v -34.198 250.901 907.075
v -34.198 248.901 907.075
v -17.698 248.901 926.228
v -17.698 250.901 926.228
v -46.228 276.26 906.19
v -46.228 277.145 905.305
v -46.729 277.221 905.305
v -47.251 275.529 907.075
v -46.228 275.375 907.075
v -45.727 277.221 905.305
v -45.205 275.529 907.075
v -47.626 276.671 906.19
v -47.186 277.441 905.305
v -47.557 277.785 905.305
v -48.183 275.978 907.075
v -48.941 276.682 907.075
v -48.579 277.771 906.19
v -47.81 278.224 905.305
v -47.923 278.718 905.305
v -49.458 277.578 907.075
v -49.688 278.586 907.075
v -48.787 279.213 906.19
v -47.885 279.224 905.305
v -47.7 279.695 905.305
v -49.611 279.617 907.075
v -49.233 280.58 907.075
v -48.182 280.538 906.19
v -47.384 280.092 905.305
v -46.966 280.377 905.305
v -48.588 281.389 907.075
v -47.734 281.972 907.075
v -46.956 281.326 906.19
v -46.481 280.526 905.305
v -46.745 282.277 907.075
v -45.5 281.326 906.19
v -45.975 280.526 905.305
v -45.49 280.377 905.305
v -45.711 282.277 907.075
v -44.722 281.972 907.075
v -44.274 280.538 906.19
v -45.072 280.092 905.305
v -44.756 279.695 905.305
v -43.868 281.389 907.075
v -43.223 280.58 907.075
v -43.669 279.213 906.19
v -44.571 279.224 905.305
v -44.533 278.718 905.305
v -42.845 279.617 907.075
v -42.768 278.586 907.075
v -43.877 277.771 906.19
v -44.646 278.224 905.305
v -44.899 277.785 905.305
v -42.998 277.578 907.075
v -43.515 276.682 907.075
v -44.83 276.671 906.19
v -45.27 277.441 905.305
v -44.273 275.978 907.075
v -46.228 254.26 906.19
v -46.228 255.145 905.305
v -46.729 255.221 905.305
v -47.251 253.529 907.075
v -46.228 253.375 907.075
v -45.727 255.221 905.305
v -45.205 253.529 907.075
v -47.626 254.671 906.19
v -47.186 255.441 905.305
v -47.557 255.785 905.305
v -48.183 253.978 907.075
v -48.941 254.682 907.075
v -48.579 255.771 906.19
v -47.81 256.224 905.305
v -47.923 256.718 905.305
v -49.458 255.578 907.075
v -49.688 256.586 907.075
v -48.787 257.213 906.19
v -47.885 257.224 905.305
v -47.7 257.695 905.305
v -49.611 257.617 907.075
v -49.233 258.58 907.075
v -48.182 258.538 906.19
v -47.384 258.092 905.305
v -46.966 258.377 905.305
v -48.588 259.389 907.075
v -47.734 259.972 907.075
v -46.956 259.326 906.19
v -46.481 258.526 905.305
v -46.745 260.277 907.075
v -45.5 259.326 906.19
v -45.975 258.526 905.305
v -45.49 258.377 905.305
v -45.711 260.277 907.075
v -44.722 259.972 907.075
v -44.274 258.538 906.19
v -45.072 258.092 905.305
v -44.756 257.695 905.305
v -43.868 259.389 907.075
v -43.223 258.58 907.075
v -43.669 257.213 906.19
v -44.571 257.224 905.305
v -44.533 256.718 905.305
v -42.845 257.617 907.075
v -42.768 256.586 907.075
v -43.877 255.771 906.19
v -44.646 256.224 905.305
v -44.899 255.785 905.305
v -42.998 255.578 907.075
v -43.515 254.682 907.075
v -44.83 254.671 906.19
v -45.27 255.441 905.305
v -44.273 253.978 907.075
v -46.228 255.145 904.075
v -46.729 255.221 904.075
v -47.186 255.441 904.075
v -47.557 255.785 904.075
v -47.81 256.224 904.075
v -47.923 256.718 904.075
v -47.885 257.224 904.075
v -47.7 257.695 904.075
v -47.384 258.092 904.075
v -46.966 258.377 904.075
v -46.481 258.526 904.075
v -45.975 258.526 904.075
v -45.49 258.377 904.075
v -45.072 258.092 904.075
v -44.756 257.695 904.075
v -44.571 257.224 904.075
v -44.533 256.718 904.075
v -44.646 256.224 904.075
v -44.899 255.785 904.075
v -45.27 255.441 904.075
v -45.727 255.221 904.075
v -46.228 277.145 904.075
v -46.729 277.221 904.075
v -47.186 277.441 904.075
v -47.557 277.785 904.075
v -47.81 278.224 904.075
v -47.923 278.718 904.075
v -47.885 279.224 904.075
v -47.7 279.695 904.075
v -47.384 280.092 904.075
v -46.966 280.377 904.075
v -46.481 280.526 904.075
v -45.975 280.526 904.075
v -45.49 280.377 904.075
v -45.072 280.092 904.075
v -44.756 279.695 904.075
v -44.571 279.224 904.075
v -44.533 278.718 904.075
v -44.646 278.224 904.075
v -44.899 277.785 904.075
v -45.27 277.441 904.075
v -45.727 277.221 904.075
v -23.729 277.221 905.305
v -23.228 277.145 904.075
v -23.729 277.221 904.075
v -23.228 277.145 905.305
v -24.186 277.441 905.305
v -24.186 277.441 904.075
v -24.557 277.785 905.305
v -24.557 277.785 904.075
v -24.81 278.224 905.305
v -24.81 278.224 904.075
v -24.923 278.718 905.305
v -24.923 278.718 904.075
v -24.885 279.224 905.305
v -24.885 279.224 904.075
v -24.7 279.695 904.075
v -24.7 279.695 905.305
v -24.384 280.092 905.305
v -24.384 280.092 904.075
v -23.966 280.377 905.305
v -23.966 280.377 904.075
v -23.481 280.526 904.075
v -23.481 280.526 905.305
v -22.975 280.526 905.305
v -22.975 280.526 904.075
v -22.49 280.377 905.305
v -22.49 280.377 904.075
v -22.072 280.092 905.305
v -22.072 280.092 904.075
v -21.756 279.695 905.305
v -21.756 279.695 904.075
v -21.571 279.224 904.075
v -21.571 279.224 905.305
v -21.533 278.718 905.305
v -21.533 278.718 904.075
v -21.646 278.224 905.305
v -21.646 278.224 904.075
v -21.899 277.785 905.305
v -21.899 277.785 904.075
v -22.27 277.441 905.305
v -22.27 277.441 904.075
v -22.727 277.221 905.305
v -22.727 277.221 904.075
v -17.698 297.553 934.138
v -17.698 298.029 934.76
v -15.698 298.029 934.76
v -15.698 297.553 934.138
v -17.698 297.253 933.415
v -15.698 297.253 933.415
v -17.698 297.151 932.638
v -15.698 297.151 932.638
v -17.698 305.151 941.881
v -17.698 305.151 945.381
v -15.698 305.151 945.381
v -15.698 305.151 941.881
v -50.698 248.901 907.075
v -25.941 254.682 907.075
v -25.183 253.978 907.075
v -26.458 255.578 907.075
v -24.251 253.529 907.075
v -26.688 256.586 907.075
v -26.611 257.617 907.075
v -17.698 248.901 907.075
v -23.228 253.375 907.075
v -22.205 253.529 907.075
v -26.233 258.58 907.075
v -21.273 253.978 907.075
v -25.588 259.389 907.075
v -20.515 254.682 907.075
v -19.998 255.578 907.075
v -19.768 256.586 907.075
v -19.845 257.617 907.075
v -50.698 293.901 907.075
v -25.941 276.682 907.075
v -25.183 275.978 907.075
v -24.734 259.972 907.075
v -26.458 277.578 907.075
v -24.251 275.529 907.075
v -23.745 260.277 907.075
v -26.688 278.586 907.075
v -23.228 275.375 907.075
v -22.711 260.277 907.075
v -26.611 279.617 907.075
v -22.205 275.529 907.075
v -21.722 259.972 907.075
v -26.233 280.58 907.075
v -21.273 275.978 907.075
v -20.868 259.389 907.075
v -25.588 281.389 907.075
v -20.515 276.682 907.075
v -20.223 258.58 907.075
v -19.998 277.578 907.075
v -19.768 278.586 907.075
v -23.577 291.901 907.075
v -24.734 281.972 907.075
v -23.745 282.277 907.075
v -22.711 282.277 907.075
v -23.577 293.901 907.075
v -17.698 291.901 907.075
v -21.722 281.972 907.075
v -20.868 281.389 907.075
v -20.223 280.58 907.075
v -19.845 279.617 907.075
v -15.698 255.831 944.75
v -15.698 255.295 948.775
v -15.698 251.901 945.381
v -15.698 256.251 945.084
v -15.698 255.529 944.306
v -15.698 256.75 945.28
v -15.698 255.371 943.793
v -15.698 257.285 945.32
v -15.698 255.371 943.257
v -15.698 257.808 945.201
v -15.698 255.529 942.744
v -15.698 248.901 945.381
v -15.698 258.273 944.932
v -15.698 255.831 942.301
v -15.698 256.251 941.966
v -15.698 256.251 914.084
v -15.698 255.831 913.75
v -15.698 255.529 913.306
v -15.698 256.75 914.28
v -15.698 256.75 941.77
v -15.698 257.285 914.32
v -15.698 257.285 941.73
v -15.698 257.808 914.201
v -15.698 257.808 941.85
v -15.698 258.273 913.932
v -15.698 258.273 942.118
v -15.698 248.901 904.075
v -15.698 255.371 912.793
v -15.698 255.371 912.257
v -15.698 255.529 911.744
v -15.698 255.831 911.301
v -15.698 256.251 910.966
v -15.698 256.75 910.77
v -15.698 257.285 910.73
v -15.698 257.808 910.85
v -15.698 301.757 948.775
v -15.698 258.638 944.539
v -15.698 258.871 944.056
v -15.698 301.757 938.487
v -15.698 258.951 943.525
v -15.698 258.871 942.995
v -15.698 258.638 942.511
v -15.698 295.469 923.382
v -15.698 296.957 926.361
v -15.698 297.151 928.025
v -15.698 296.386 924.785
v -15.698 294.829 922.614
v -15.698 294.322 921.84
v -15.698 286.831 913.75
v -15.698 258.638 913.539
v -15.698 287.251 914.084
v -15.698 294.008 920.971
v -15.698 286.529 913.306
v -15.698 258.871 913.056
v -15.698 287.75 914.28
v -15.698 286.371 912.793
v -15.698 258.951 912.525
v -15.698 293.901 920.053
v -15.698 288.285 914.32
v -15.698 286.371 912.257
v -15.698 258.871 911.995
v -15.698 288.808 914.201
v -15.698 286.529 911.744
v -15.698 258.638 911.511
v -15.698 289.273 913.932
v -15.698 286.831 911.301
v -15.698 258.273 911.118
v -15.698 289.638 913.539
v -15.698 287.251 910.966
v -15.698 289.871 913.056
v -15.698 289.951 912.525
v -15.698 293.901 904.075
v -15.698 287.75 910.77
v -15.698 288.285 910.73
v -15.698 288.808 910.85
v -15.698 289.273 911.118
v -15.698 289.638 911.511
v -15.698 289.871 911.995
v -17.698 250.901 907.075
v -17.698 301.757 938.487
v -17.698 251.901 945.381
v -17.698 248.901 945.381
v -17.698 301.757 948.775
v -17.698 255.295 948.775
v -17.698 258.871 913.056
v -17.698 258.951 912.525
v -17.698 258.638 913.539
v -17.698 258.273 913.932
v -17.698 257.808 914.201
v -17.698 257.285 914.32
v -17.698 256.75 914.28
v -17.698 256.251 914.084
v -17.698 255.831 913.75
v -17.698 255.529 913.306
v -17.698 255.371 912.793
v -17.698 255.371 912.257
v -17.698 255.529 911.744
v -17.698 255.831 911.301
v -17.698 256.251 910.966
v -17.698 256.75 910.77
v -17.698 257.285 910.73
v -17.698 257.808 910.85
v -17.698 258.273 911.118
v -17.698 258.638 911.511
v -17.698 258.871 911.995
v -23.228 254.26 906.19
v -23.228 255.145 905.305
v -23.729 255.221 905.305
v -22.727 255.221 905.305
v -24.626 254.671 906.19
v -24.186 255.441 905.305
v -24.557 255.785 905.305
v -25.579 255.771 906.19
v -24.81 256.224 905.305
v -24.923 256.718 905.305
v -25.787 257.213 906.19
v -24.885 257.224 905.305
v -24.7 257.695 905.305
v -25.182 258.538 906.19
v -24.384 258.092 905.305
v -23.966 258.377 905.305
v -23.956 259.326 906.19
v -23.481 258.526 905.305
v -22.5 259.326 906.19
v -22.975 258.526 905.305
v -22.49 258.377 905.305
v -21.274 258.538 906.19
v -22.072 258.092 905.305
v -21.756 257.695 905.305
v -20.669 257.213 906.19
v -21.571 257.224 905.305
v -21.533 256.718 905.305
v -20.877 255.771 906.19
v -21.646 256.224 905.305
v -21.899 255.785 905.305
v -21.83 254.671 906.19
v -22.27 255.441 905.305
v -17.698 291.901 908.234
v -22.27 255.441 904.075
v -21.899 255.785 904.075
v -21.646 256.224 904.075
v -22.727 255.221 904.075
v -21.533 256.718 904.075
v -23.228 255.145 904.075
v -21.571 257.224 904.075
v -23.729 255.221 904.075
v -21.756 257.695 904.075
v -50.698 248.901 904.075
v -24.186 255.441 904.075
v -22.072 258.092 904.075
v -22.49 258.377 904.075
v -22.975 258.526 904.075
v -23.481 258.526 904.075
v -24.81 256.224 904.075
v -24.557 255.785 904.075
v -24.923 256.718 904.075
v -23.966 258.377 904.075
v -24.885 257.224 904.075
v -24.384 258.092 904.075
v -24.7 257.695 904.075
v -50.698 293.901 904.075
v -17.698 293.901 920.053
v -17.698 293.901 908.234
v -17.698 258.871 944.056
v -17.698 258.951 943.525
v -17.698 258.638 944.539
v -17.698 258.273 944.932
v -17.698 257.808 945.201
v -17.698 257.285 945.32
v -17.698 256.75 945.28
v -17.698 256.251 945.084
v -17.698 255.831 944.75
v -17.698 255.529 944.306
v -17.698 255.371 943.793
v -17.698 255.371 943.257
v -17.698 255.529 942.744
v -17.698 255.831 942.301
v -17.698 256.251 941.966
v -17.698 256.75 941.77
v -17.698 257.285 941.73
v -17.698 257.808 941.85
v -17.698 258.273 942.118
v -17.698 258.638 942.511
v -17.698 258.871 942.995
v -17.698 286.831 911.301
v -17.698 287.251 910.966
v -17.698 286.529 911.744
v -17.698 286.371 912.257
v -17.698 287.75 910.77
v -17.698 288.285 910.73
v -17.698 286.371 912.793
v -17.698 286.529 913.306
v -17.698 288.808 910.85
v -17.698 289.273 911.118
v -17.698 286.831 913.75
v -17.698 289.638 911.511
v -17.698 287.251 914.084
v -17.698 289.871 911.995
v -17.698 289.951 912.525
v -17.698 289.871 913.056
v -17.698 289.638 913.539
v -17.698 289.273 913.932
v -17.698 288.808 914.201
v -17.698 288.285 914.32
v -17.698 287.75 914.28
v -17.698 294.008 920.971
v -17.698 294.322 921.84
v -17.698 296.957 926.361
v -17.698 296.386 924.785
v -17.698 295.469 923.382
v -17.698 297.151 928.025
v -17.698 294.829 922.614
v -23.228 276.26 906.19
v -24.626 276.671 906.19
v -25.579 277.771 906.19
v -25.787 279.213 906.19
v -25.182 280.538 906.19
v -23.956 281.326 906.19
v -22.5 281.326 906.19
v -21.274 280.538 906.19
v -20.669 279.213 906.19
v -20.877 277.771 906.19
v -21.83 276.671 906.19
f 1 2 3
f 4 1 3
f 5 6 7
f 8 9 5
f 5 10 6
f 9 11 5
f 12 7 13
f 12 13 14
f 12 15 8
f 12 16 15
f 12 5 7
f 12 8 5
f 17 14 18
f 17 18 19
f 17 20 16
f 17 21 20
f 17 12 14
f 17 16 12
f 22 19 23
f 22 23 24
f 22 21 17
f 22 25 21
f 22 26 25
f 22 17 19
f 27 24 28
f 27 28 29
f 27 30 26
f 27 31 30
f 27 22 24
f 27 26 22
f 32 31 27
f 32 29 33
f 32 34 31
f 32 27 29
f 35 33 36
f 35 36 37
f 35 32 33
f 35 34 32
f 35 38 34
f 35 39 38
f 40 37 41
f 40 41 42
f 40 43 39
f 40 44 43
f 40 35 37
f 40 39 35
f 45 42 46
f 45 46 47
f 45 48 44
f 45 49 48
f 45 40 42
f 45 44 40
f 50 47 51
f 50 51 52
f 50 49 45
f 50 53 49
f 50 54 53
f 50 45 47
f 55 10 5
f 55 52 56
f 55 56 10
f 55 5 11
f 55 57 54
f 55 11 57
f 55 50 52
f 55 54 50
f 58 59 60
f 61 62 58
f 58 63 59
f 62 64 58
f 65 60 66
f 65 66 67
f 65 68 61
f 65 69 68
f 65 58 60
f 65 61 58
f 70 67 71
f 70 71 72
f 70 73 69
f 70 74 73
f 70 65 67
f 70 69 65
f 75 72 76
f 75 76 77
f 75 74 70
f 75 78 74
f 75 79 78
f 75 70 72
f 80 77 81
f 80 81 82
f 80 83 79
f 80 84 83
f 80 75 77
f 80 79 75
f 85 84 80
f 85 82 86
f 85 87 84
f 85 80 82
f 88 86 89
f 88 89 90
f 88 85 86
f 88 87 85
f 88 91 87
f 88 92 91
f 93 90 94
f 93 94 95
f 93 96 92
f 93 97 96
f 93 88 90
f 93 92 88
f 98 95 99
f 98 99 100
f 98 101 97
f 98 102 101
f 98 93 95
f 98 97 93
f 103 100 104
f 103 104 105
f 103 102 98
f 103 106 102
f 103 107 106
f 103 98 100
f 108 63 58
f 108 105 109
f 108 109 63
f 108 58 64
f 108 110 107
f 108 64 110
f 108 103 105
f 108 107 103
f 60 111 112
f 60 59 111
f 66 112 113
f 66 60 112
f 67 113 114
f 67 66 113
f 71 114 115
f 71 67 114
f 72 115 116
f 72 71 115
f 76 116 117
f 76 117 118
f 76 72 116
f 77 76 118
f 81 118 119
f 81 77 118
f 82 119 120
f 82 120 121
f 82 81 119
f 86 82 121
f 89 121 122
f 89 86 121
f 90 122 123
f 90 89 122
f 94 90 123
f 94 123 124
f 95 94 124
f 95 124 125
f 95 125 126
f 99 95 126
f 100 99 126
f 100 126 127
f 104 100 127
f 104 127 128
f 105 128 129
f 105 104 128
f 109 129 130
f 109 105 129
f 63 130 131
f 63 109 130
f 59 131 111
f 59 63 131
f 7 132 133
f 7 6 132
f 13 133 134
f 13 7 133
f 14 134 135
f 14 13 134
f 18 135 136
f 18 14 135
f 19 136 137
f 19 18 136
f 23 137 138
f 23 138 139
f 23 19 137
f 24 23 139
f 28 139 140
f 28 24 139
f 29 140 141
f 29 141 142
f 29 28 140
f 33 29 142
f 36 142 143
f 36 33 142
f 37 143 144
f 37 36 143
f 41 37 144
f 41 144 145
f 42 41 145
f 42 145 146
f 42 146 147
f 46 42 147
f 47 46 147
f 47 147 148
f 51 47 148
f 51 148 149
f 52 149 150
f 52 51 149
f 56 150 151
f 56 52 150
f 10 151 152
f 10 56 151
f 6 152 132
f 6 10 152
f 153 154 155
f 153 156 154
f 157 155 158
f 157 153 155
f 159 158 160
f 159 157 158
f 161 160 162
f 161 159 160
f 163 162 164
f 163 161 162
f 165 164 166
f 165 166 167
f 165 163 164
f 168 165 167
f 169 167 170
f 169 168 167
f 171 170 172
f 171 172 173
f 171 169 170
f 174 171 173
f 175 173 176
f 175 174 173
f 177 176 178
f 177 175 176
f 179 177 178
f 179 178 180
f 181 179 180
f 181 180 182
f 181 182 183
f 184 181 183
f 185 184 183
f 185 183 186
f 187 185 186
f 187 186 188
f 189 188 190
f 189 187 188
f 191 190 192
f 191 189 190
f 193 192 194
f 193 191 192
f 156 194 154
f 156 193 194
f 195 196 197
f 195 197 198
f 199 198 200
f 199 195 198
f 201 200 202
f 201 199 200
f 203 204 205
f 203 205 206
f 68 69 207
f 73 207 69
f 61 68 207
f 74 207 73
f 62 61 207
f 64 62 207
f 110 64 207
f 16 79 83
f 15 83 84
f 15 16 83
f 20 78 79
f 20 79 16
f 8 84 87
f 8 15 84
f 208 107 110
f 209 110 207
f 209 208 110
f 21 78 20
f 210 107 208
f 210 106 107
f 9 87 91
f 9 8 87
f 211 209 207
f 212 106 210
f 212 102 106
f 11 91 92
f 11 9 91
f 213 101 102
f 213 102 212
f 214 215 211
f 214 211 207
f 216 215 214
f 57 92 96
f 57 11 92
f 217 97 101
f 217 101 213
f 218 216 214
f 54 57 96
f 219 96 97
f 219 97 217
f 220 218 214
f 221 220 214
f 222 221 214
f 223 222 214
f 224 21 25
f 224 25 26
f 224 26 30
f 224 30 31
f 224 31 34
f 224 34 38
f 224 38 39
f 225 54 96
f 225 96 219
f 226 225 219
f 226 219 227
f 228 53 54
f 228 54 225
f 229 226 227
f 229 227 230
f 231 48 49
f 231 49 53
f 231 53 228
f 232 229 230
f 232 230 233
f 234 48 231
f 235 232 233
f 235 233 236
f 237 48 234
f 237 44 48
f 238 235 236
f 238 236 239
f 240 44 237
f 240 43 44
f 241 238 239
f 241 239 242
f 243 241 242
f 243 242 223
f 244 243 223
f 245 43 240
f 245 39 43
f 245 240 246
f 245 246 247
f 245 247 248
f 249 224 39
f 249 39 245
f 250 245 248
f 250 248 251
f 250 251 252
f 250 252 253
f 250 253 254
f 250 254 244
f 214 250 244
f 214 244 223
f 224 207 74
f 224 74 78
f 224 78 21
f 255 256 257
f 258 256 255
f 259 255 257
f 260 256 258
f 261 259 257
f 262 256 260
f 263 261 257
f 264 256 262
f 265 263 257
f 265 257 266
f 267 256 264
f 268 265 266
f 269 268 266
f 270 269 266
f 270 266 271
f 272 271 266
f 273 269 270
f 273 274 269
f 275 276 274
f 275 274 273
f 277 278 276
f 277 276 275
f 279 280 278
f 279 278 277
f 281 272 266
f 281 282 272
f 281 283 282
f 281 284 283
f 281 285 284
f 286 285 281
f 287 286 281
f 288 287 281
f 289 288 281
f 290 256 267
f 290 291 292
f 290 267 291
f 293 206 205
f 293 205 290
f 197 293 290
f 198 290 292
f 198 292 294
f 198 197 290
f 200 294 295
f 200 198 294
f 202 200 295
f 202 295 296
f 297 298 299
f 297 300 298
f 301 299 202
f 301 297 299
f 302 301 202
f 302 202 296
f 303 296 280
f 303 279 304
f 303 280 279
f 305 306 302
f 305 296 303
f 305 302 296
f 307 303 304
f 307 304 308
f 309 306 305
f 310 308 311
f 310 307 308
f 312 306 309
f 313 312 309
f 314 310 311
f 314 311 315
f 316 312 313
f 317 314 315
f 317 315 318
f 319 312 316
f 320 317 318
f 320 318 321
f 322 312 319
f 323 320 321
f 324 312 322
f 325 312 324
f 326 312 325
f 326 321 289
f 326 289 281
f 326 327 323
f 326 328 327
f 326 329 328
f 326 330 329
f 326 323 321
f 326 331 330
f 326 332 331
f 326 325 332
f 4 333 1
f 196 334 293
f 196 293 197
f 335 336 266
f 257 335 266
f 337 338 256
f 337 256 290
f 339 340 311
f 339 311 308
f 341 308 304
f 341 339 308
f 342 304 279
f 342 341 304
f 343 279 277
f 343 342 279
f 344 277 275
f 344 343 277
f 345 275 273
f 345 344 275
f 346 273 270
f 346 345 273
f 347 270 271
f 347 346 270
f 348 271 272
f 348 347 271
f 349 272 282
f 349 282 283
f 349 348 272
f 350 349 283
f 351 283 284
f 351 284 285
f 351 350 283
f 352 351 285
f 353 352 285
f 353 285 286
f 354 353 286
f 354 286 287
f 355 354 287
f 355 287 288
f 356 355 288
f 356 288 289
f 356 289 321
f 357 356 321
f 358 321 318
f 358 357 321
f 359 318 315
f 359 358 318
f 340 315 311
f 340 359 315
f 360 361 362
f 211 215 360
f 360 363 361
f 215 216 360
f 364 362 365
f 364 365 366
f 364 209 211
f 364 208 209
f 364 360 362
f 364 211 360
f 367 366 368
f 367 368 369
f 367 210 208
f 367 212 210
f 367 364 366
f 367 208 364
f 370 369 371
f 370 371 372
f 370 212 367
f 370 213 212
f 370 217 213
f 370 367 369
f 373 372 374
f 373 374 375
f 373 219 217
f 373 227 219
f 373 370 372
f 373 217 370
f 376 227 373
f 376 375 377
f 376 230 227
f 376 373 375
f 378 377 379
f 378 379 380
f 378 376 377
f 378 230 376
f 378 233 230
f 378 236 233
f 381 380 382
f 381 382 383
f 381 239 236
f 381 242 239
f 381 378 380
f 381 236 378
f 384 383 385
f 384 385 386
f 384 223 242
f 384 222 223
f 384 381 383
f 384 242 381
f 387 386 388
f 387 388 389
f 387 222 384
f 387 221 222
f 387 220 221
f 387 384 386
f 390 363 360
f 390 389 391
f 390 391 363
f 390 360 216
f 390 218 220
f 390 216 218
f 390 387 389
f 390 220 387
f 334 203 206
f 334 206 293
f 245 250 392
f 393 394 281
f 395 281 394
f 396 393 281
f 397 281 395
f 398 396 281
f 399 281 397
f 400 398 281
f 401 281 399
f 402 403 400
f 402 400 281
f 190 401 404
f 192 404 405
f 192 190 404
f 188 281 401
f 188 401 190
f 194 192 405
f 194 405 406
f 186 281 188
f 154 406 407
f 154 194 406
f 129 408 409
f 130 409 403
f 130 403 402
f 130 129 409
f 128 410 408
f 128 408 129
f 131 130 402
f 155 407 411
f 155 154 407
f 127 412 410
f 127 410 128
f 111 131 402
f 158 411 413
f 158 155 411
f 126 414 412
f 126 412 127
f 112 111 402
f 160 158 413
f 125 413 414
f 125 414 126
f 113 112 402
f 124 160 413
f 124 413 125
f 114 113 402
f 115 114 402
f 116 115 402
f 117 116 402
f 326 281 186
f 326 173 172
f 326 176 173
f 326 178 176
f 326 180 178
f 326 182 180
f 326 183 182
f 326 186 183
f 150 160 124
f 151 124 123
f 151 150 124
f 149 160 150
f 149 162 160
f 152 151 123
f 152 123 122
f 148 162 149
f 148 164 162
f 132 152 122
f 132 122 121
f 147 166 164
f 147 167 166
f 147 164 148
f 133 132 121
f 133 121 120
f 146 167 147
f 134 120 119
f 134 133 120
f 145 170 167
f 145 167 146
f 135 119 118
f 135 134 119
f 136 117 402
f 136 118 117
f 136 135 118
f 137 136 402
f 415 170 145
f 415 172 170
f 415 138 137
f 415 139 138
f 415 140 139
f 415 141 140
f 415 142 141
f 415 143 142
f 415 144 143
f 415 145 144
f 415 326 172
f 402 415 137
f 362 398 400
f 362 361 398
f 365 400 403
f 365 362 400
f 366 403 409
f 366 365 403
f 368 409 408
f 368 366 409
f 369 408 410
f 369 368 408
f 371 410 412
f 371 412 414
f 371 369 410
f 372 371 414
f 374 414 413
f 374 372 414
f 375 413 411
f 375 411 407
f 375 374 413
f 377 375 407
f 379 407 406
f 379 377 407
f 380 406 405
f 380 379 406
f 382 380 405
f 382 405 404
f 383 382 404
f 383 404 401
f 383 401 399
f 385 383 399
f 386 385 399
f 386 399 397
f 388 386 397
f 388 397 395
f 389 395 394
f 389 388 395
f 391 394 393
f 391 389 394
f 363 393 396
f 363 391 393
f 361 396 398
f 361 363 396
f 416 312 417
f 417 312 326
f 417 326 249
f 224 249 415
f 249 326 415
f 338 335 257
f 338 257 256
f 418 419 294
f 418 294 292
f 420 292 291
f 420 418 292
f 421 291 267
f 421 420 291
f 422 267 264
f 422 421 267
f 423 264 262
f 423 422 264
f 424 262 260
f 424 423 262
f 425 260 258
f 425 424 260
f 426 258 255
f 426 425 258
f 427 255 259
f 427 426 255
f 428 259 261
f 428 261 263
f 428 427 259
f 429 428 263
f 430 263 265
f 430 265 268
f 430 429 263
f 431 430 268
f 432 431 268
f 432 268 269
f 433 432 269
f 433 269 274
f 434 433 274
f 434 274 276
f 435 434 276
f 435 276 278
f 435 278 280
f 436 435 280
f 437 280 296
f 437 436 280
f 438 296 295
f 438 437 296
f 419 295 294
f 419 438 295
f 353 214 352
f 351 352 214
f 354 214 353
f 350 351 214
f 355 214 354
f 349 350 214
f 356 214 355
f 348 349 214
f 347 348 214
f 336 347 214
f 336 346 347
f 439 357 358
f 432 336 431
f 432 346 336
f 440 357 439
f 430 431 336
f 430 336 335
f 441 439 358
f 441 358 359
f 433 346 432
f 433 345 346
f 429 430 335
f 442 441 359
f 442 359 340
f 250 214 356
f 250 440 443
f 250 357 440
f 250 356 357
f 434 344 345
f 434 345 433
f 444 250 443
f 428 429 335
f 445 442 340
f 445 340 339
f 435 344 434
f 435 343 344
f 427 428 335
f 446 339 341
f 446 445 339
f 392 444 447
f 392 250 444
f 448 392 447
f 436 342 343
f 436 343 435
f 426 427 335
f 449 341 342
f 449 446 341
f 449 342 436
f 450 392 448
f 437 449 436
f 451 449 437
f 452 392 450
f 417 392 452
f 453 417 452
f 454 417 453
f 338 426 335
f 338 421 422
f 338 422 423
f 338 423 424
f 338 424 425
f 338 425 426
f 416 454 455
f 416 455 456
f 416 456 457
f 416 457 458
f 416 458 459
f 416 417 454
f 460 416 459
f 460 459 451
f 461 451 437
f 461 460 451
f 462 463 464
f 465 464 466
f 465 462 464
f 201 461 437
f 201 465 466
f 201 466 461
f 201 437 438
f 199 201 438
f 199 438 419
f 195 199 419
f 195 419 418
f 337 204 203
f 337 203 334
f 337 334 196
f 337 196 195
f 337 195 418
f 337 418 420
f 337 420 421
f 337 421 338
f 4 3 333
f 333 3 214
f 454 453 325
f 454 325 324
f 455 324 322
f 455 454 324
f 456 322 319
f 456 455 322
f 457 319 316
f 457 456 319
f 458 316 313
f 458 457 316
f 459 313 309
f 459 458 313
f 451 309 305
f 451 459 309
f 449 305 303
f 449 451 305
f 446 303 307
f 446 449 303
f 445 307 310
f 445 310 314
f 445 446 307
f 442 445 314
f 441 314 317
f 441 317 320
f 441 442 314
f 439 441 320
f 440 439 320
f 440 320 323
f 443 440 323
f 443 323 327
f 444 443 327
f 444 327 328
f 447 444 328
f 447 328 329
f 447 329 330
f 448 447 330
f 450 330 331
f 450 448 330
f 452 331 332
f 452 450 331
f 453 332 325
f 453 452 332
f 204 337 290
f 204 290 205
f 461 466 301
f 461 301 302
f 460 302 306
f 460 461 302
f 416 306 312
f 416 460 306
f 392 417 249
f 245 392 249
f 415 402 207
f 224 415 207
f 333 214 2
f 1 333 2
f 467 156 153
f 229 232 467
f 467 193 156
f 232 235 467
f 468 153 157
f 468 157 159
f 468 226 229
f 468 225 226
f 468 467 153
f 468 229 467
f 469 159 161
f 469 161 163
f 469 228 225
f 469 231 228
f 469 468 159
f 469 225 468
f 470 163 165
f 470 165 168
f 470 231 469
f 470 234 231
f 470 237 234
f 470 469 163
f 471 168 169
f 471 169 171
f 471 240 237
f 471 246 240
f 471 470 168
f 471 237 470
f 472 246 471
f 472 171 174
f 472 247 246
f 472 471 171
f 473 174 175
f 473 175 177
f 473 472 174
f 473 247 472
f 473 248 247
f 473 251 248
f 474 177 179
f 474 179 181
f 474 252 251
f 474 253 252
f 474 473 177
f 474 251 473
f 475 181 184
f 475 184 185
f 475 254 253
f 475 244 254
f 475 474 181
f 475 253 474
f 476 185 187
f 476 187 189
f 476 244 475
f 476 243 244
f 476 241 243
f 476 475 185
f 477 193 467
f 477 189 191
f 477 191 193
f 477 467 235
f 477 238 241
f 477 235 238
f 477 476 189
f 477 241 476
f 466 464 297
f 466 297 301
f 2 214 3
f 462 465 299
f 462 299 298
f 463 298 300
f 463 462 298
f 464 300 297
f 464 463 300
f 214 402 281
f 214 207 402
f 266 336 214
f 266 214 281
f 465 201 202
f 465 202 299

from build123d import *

# Parameters (mm, degrees)
SKETCH1_R                                    = 1.8
BOSS_EXTRUDE1_DEPTH                          = 2
BOSS_EXTRUDE2_DEPTH                          = 33
BOSS_EXTRUDE3_DEPTH                          = 1
BOSS_EXTRUDE4_DEPTH                          = 3
BOSS_EXTRUDE4_DEPTH_BACK                     = 0.0001
BOSS_EXTRUDE5_DEPTH                          = 2.5
CUT_EXTRUDE1_DEPTH                           = 3
CUT_EXTRUDE2_DEPTH                           = 3
CSK_FOR_M3_HEX_SOCKET_COUNTERSUNK_HE_2_COUNT = 2
CSK_FOR_M3_HEX_SOCKET_COUNTERSUNK_HE_2_PITCH = 23
CSK_FOR_M3_HEX_SOCKET_COUNTERSUNK_HE_3_COUNT = 2
CSK_FOR_M3_HEX_SOCKET_COUNTERSUNK_HE_3_PITCH = 22
CSK_FOR_M3_HEX_SOCKET_COUNTERSUNK_HE_4_COUNT = 2
CSK_FOR_M3_HEX_SOCKET_COUNTERSUNK_HE_4_PITCH = 31.827660926
BOSS_EXTRUDE6_DEPTH                          = 2
BOSS_EXTRUDE7_DEPTH                          = 2


with BuildPart() as part:
    # Sketch1 → Boss-Extrude1 (new body)
    with BuildSketch(Plane(origin=(-17.698305603, 0, 0), x_dir=(0, 0, -1), z_dir=(1, 0, 0))):
        with BuildLine():
            Line((-911.775195292, 293.900701951), (-904.075195292, 293.900701951))
            Line((-904.075195292, 293.900701951), (-904.075195292, 251.900701951))
            Line((-904.075195292, 251.900701951), (-910.669307841, 251.900701951))
            Line((-910.669307841, 251.900701951), (-945.381082742, 251.900701951))
            Line((-945.381082742, 251.900701951), (-948.775195292, 255.294814501))
            Line((-948.775195292, 255.294814501), (-948.775195292, 301.756589401))
            Line((-948.775195292, 301.756589401), (-945.381082742, 305.150701951))
            Line((-945.381082742, 305.150701951), (-941.881082742, 305.150701951))
            Line((-941.881082742, 305.150701951), (-938.486970192, 301.756589401))
            Line((-938.486970192, 301.756589401), (-934.759762398, 298.029381608))
            ThreePointArc((-934.759762398, 298.029381608), (-933.786492352, 297.379063354), (-932.638442055, 297.150701951))
            Line((-932.638442055, 297.150701951), (-928.025195292, 297.150701951))
            ThreePointArc((-928.025195292, 297.150701951), (-925.55612657, 296.717313987), (-923.382248102, 295.468963923))
            Line((-923.382248102, 295.468963923), (-922.614211968, 294.828557415))
            ThreePointArc((-922.614211968, 294.828557415), (-921.414830744, 294.139812552), (-920.052585932, 293.900701951))
            Line((-920.052585932, 293.900701951), (-911.775195292, 293.900701951))
        make_face()
        with Locations(Location((-912.525195292, 288.150701951, 0), (0, 0, 90))):
            Circle(SKETCH1_R, mode=Mode.SUBTRACT)
        with Locations(Location((-912.525195292, 257.150701951, 0), (0, 0, 90))):
            Circle(SKETCH1_R, mode=Mode.SUBTRACT)
        with Locations(Location((-943.525195292, 257.150701951, 0), (0, 0, 90))):
            Circle(SKETCH1_R, mode=Mode.SUBTRACT)
    extrude(amount=BOSS_EXTRUDE1_DEPTH)

    # Sketch2 → Boss-Extrude2 (add)
    with BuildSketch(Plane.ZY.offset(17.698305603)):
        Polygon((907.075195292, 293.900701951), (907.075195292, 255.737509851), (907.075195292, 251.900701951), (904.075195292, 251.900701951), (904.075195292, 293.900701951), align=None)
    extrude(amount=BOSS_EXTRUDE2_DEPTH)

    # Sketch3 → Boss-Extrude3 (add)
    with BuildSketch(Plane(origin=(0, 293.900701951, 0), x_dir=(1, 0, 0), z_dir=(0, 1, 0))):
        Polygon((24.09465277, -907.075195292), (-17.698305603, -910.725195292), (-17.698305603, -907.075195292), align=None)
    extrude(amount=-BOSS_EXTRUDE3_DEPTH)

    # Sketch4 → Boss-Extrude4 (add, two sides: drawn at the far end of the back side and taken through both)
    with BuildSketch(Plane.XZ.offset(-251.900701951).offset(-BOSS_EXTRUDE4_DEPTH_BACK)):
        Polygon((-50.698305603, 907.075195292), (-17.698305603, 907.075195292), (-17.698305603, 945.381082742), (-15.698305603, 945.381082742), (-15.698305603, 904.075195292), (-50.698305603, 904.075195292), align=None)
    extrude(amount=BOSS_EXTRUDE4_DEPTH + BOSS_EXTRUDE4_DEPTH_BACK)

    # Sketch5 → Boss-Extrude5 (add)
    with BuildSketch(Plane.XZ.offset(-248.900701951)):
        Polygon((11.795887964, 907.075195292), (-17.698305603, 926.228139017), (-17.698305603, 907.075195292), align=None)
    extrude(amount=-BOSS_EXTRUDE5_DEPTH)

    # Sketch10 → Cut-Extrude1 (cut)
    with BuildSketch(Plane(origin=(0, 293.900701951, 0), x_dir=(1, 0, 0), z_dir=(0, 1, 0))):
        Polygon((-15.698305603, -907.075195292), (-15.698305603, -910.550524718), (24.09465277, -907.075195292), align=None)
    extrude(amount=-CUT_EXTRUDE1_DEPTH, mode=Mode.SUBTRACT)

    # Sketch11 → Cut-Extrude2 (cut)
    with BuildSketch(Plane(origin=(0, 251.400701951, 0), x_dir=(1, 0, 0), z_dir=(0, 1, 0))):
        Polygon((11.795887964, -907.075195292), (-15.698305603, -907.075195292), (-15.698305603, -924.929378725), align=None)
    extrude(amount=-CUT_EXTRUDE2_DEPTH, mode=Mode.SUBTRACT)

    # Sketch15 → CSK for M3 Hex Socket Countersunk Head Screw2 (revolve, cut)
    with BuildSketch(Plane(origin=(-46.228014557, 278.845328546, 907.075195292), x_dir=(0, -1, 0), z_dir=(1, 0, 0))):
        Polygon((0, 0), (0, 3), (1.7, 3), (1.7, 1.77), (3.47, 0), align=None)
    csk_for_m3_hex_socket_countersunk_head_s = revolve(axis=Axis((-46.228014557, 278.845328546, 913.425195292), (0, 0, -1)), mode=Mode.SUBTRACT)

    # CSK for M3 Hex Socket Countersunk He 2: CSK for M3 Hex Socket Countersunk Head Screw2 ×2
    with Locations(*[(i * CSK_FOR_M3_HEX_SOCKET_COUNTERSUNK_HE_2_PITCH, 0, 0) for i in range(1, CSK_FOR_M3_HEX_SOCKET_COUNTERSUNK_HE_2_COUNT)]):
        add(csk_for_m3_hex_socket_countersunk_head_s, mode=Mode.SUBTRACT)

    # CSK for M3 Hex Socket Countersunk He 3: CSK for M3 Hex Socket Countersunk Head Screw2 ×2
    with Locations(*[(0, -i * CSK_FOR_M3_HEX_SOCKET_COUNTERSUNK_HE_3_PITCH, 0) for i in range(1, CSK_FOR_M3_HEX_SOCKET_COUNTERSUNK_HE_3_COUNT)]):
        add(csk_for_m3_hex_socket_countersunk_head_s, mode=Mode.SUBTRACT)

    # CSK for M3 Hex Socket Countersunk He 4: CSK for M3 Hex Socket Countersunk Head Screw2 ×2
    with Locations(*[Vector(0.7226418571476992, -0.6912226459673644, 0) * (i * CSK_FOR_M3_HEX_SOCKET_COUNTERSUNK_HE_4_PITCH) for i in range(1, CSK_FOR_M3_HEX_SOCKET_COUNTERSUNK_HE_4_COUNT)]):
        add(csk_for_m3_hex_socket_countersunk_head_s, mode=Mode.SUBTRACT)

    # Sketch17 → Boss-Extrude7 (add)
    with BuildSketch(Plane(origin=(0, 293.900701951, 0), x_dir=(1, 0, 0), z_dir=(0, 1, 0))):
        Polygon((-17.698305603, -908.234078598), (-23.577151031, -907.075195292), (-17.698305603, -907.075195292), align=None)
    extrude(amount=-BOSS_EXTRUDE7_DEPTH)


with BuildPart() as body_2:
    # Sketch16 → Boss-Extrude6 (new body)
    with BuildSketch(Plane.XZ.offset(-248.900701951)):
        Polygon((-34.198305603, 907.075195292), (-17.698305603, 926.228139017), (-17.698305603, 907.075195292), align=None)
    extrude(amount=-BOSS_EXTRUDE6_DEPTH)


solid = Compound([part.part, body_2.part])
